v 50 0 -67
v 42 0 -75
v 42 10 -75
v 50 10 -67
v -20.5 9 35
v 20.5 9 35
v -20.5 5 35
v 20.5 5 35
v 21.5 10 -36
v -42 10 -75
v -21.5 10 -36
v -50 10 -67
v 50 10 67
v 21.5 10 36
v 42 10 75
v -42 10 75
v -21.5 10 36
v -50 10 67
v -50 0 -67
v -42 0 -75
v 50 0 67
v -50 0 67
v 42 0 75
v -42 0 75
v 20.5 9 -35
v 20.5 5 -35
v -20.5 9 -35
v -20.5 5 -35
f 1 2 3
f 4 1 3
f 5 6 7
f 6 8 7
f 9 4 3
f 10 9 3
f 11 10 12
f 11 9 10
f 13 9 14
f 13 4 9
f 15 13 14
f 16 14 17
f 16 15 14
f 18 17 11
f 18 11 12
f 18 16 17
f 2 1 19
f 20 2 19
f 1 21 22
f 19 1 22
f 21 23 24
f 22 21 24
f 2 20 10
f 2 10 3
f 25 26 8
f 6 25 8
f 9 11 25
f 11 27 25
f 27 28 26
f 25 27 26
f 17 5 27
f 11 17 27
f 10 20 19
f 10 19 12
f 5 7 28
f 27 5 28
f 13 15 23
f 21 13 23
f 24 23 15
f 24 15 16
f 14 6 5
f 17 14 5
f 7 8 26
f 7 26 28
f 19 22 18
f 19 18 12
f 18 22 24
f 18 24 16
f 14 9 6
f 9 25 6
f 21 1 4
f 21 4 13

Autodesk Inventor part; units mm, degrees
ref_plane "YZ Plane" through (0, 0, 0) normal (1, 0, 0) x (0, 1, 0)
ref_plane "XZ Plane" through (0, 0, 0) normal (0, 1, 0) x (-1, 0, 0)
ref_plane "XY Plane" through (0, 0, 0) normal (0, 0, 1) x (1, 0, 0)
sketch "Sketch1" plane through (0, 0, 0) normal (0, 1, 0) x (-1, 0, 0)
  line L0 (-20.5, 35) -> (20.5, 35)
  line L1 (20.5, 35) -> (20.5, -35)
  line L2 (20.5, -35) -> (-20.5, -35)
  line L3 (-20.5, -35) -> (-20.5, 35)
  line L4 (-20.5, 35) -> (20.5, -35) construction
  line L5 (20.5, 35) -> (-20.5, -35) construction
  line L6 (-50, 75) -> (50, 75)
  line L7 (50, 75) -> (50, -75)
  line L8 (50, -75) -> (-50, -75)
  line L9 (-50, -75) -> (-50, 75)
  line L10 (-50, 75) -> (50, -75) construction
  line L11 (50, 75) -> (-50, -75) construction
  point P0 (0, 0)
  dimension "d0" = 41
  dimension "d1" = 70
  dimension "d2" = 150
  dimension "d3" = 100
extrude "Extrusion1" add sketch "Sketch1" along normal blind 10
extrude "Extrusion2" add sketch "Sketch1" along normal blind 5 contours L0 L1 L2 L3
chamfer "Chamfer1" distance 1 angle 45 4 edges at (-20.5, 10, 0) (0, 10, 35) (0, 10, -35) (20.5, 10, 0)
chamfer "Chamfer2" distance 8 angle 45 4 edges at (-50, 5, 75) (-50, 5, -75) (50, 5, -75) (50, 5, 75)
properties part number "pallet"
